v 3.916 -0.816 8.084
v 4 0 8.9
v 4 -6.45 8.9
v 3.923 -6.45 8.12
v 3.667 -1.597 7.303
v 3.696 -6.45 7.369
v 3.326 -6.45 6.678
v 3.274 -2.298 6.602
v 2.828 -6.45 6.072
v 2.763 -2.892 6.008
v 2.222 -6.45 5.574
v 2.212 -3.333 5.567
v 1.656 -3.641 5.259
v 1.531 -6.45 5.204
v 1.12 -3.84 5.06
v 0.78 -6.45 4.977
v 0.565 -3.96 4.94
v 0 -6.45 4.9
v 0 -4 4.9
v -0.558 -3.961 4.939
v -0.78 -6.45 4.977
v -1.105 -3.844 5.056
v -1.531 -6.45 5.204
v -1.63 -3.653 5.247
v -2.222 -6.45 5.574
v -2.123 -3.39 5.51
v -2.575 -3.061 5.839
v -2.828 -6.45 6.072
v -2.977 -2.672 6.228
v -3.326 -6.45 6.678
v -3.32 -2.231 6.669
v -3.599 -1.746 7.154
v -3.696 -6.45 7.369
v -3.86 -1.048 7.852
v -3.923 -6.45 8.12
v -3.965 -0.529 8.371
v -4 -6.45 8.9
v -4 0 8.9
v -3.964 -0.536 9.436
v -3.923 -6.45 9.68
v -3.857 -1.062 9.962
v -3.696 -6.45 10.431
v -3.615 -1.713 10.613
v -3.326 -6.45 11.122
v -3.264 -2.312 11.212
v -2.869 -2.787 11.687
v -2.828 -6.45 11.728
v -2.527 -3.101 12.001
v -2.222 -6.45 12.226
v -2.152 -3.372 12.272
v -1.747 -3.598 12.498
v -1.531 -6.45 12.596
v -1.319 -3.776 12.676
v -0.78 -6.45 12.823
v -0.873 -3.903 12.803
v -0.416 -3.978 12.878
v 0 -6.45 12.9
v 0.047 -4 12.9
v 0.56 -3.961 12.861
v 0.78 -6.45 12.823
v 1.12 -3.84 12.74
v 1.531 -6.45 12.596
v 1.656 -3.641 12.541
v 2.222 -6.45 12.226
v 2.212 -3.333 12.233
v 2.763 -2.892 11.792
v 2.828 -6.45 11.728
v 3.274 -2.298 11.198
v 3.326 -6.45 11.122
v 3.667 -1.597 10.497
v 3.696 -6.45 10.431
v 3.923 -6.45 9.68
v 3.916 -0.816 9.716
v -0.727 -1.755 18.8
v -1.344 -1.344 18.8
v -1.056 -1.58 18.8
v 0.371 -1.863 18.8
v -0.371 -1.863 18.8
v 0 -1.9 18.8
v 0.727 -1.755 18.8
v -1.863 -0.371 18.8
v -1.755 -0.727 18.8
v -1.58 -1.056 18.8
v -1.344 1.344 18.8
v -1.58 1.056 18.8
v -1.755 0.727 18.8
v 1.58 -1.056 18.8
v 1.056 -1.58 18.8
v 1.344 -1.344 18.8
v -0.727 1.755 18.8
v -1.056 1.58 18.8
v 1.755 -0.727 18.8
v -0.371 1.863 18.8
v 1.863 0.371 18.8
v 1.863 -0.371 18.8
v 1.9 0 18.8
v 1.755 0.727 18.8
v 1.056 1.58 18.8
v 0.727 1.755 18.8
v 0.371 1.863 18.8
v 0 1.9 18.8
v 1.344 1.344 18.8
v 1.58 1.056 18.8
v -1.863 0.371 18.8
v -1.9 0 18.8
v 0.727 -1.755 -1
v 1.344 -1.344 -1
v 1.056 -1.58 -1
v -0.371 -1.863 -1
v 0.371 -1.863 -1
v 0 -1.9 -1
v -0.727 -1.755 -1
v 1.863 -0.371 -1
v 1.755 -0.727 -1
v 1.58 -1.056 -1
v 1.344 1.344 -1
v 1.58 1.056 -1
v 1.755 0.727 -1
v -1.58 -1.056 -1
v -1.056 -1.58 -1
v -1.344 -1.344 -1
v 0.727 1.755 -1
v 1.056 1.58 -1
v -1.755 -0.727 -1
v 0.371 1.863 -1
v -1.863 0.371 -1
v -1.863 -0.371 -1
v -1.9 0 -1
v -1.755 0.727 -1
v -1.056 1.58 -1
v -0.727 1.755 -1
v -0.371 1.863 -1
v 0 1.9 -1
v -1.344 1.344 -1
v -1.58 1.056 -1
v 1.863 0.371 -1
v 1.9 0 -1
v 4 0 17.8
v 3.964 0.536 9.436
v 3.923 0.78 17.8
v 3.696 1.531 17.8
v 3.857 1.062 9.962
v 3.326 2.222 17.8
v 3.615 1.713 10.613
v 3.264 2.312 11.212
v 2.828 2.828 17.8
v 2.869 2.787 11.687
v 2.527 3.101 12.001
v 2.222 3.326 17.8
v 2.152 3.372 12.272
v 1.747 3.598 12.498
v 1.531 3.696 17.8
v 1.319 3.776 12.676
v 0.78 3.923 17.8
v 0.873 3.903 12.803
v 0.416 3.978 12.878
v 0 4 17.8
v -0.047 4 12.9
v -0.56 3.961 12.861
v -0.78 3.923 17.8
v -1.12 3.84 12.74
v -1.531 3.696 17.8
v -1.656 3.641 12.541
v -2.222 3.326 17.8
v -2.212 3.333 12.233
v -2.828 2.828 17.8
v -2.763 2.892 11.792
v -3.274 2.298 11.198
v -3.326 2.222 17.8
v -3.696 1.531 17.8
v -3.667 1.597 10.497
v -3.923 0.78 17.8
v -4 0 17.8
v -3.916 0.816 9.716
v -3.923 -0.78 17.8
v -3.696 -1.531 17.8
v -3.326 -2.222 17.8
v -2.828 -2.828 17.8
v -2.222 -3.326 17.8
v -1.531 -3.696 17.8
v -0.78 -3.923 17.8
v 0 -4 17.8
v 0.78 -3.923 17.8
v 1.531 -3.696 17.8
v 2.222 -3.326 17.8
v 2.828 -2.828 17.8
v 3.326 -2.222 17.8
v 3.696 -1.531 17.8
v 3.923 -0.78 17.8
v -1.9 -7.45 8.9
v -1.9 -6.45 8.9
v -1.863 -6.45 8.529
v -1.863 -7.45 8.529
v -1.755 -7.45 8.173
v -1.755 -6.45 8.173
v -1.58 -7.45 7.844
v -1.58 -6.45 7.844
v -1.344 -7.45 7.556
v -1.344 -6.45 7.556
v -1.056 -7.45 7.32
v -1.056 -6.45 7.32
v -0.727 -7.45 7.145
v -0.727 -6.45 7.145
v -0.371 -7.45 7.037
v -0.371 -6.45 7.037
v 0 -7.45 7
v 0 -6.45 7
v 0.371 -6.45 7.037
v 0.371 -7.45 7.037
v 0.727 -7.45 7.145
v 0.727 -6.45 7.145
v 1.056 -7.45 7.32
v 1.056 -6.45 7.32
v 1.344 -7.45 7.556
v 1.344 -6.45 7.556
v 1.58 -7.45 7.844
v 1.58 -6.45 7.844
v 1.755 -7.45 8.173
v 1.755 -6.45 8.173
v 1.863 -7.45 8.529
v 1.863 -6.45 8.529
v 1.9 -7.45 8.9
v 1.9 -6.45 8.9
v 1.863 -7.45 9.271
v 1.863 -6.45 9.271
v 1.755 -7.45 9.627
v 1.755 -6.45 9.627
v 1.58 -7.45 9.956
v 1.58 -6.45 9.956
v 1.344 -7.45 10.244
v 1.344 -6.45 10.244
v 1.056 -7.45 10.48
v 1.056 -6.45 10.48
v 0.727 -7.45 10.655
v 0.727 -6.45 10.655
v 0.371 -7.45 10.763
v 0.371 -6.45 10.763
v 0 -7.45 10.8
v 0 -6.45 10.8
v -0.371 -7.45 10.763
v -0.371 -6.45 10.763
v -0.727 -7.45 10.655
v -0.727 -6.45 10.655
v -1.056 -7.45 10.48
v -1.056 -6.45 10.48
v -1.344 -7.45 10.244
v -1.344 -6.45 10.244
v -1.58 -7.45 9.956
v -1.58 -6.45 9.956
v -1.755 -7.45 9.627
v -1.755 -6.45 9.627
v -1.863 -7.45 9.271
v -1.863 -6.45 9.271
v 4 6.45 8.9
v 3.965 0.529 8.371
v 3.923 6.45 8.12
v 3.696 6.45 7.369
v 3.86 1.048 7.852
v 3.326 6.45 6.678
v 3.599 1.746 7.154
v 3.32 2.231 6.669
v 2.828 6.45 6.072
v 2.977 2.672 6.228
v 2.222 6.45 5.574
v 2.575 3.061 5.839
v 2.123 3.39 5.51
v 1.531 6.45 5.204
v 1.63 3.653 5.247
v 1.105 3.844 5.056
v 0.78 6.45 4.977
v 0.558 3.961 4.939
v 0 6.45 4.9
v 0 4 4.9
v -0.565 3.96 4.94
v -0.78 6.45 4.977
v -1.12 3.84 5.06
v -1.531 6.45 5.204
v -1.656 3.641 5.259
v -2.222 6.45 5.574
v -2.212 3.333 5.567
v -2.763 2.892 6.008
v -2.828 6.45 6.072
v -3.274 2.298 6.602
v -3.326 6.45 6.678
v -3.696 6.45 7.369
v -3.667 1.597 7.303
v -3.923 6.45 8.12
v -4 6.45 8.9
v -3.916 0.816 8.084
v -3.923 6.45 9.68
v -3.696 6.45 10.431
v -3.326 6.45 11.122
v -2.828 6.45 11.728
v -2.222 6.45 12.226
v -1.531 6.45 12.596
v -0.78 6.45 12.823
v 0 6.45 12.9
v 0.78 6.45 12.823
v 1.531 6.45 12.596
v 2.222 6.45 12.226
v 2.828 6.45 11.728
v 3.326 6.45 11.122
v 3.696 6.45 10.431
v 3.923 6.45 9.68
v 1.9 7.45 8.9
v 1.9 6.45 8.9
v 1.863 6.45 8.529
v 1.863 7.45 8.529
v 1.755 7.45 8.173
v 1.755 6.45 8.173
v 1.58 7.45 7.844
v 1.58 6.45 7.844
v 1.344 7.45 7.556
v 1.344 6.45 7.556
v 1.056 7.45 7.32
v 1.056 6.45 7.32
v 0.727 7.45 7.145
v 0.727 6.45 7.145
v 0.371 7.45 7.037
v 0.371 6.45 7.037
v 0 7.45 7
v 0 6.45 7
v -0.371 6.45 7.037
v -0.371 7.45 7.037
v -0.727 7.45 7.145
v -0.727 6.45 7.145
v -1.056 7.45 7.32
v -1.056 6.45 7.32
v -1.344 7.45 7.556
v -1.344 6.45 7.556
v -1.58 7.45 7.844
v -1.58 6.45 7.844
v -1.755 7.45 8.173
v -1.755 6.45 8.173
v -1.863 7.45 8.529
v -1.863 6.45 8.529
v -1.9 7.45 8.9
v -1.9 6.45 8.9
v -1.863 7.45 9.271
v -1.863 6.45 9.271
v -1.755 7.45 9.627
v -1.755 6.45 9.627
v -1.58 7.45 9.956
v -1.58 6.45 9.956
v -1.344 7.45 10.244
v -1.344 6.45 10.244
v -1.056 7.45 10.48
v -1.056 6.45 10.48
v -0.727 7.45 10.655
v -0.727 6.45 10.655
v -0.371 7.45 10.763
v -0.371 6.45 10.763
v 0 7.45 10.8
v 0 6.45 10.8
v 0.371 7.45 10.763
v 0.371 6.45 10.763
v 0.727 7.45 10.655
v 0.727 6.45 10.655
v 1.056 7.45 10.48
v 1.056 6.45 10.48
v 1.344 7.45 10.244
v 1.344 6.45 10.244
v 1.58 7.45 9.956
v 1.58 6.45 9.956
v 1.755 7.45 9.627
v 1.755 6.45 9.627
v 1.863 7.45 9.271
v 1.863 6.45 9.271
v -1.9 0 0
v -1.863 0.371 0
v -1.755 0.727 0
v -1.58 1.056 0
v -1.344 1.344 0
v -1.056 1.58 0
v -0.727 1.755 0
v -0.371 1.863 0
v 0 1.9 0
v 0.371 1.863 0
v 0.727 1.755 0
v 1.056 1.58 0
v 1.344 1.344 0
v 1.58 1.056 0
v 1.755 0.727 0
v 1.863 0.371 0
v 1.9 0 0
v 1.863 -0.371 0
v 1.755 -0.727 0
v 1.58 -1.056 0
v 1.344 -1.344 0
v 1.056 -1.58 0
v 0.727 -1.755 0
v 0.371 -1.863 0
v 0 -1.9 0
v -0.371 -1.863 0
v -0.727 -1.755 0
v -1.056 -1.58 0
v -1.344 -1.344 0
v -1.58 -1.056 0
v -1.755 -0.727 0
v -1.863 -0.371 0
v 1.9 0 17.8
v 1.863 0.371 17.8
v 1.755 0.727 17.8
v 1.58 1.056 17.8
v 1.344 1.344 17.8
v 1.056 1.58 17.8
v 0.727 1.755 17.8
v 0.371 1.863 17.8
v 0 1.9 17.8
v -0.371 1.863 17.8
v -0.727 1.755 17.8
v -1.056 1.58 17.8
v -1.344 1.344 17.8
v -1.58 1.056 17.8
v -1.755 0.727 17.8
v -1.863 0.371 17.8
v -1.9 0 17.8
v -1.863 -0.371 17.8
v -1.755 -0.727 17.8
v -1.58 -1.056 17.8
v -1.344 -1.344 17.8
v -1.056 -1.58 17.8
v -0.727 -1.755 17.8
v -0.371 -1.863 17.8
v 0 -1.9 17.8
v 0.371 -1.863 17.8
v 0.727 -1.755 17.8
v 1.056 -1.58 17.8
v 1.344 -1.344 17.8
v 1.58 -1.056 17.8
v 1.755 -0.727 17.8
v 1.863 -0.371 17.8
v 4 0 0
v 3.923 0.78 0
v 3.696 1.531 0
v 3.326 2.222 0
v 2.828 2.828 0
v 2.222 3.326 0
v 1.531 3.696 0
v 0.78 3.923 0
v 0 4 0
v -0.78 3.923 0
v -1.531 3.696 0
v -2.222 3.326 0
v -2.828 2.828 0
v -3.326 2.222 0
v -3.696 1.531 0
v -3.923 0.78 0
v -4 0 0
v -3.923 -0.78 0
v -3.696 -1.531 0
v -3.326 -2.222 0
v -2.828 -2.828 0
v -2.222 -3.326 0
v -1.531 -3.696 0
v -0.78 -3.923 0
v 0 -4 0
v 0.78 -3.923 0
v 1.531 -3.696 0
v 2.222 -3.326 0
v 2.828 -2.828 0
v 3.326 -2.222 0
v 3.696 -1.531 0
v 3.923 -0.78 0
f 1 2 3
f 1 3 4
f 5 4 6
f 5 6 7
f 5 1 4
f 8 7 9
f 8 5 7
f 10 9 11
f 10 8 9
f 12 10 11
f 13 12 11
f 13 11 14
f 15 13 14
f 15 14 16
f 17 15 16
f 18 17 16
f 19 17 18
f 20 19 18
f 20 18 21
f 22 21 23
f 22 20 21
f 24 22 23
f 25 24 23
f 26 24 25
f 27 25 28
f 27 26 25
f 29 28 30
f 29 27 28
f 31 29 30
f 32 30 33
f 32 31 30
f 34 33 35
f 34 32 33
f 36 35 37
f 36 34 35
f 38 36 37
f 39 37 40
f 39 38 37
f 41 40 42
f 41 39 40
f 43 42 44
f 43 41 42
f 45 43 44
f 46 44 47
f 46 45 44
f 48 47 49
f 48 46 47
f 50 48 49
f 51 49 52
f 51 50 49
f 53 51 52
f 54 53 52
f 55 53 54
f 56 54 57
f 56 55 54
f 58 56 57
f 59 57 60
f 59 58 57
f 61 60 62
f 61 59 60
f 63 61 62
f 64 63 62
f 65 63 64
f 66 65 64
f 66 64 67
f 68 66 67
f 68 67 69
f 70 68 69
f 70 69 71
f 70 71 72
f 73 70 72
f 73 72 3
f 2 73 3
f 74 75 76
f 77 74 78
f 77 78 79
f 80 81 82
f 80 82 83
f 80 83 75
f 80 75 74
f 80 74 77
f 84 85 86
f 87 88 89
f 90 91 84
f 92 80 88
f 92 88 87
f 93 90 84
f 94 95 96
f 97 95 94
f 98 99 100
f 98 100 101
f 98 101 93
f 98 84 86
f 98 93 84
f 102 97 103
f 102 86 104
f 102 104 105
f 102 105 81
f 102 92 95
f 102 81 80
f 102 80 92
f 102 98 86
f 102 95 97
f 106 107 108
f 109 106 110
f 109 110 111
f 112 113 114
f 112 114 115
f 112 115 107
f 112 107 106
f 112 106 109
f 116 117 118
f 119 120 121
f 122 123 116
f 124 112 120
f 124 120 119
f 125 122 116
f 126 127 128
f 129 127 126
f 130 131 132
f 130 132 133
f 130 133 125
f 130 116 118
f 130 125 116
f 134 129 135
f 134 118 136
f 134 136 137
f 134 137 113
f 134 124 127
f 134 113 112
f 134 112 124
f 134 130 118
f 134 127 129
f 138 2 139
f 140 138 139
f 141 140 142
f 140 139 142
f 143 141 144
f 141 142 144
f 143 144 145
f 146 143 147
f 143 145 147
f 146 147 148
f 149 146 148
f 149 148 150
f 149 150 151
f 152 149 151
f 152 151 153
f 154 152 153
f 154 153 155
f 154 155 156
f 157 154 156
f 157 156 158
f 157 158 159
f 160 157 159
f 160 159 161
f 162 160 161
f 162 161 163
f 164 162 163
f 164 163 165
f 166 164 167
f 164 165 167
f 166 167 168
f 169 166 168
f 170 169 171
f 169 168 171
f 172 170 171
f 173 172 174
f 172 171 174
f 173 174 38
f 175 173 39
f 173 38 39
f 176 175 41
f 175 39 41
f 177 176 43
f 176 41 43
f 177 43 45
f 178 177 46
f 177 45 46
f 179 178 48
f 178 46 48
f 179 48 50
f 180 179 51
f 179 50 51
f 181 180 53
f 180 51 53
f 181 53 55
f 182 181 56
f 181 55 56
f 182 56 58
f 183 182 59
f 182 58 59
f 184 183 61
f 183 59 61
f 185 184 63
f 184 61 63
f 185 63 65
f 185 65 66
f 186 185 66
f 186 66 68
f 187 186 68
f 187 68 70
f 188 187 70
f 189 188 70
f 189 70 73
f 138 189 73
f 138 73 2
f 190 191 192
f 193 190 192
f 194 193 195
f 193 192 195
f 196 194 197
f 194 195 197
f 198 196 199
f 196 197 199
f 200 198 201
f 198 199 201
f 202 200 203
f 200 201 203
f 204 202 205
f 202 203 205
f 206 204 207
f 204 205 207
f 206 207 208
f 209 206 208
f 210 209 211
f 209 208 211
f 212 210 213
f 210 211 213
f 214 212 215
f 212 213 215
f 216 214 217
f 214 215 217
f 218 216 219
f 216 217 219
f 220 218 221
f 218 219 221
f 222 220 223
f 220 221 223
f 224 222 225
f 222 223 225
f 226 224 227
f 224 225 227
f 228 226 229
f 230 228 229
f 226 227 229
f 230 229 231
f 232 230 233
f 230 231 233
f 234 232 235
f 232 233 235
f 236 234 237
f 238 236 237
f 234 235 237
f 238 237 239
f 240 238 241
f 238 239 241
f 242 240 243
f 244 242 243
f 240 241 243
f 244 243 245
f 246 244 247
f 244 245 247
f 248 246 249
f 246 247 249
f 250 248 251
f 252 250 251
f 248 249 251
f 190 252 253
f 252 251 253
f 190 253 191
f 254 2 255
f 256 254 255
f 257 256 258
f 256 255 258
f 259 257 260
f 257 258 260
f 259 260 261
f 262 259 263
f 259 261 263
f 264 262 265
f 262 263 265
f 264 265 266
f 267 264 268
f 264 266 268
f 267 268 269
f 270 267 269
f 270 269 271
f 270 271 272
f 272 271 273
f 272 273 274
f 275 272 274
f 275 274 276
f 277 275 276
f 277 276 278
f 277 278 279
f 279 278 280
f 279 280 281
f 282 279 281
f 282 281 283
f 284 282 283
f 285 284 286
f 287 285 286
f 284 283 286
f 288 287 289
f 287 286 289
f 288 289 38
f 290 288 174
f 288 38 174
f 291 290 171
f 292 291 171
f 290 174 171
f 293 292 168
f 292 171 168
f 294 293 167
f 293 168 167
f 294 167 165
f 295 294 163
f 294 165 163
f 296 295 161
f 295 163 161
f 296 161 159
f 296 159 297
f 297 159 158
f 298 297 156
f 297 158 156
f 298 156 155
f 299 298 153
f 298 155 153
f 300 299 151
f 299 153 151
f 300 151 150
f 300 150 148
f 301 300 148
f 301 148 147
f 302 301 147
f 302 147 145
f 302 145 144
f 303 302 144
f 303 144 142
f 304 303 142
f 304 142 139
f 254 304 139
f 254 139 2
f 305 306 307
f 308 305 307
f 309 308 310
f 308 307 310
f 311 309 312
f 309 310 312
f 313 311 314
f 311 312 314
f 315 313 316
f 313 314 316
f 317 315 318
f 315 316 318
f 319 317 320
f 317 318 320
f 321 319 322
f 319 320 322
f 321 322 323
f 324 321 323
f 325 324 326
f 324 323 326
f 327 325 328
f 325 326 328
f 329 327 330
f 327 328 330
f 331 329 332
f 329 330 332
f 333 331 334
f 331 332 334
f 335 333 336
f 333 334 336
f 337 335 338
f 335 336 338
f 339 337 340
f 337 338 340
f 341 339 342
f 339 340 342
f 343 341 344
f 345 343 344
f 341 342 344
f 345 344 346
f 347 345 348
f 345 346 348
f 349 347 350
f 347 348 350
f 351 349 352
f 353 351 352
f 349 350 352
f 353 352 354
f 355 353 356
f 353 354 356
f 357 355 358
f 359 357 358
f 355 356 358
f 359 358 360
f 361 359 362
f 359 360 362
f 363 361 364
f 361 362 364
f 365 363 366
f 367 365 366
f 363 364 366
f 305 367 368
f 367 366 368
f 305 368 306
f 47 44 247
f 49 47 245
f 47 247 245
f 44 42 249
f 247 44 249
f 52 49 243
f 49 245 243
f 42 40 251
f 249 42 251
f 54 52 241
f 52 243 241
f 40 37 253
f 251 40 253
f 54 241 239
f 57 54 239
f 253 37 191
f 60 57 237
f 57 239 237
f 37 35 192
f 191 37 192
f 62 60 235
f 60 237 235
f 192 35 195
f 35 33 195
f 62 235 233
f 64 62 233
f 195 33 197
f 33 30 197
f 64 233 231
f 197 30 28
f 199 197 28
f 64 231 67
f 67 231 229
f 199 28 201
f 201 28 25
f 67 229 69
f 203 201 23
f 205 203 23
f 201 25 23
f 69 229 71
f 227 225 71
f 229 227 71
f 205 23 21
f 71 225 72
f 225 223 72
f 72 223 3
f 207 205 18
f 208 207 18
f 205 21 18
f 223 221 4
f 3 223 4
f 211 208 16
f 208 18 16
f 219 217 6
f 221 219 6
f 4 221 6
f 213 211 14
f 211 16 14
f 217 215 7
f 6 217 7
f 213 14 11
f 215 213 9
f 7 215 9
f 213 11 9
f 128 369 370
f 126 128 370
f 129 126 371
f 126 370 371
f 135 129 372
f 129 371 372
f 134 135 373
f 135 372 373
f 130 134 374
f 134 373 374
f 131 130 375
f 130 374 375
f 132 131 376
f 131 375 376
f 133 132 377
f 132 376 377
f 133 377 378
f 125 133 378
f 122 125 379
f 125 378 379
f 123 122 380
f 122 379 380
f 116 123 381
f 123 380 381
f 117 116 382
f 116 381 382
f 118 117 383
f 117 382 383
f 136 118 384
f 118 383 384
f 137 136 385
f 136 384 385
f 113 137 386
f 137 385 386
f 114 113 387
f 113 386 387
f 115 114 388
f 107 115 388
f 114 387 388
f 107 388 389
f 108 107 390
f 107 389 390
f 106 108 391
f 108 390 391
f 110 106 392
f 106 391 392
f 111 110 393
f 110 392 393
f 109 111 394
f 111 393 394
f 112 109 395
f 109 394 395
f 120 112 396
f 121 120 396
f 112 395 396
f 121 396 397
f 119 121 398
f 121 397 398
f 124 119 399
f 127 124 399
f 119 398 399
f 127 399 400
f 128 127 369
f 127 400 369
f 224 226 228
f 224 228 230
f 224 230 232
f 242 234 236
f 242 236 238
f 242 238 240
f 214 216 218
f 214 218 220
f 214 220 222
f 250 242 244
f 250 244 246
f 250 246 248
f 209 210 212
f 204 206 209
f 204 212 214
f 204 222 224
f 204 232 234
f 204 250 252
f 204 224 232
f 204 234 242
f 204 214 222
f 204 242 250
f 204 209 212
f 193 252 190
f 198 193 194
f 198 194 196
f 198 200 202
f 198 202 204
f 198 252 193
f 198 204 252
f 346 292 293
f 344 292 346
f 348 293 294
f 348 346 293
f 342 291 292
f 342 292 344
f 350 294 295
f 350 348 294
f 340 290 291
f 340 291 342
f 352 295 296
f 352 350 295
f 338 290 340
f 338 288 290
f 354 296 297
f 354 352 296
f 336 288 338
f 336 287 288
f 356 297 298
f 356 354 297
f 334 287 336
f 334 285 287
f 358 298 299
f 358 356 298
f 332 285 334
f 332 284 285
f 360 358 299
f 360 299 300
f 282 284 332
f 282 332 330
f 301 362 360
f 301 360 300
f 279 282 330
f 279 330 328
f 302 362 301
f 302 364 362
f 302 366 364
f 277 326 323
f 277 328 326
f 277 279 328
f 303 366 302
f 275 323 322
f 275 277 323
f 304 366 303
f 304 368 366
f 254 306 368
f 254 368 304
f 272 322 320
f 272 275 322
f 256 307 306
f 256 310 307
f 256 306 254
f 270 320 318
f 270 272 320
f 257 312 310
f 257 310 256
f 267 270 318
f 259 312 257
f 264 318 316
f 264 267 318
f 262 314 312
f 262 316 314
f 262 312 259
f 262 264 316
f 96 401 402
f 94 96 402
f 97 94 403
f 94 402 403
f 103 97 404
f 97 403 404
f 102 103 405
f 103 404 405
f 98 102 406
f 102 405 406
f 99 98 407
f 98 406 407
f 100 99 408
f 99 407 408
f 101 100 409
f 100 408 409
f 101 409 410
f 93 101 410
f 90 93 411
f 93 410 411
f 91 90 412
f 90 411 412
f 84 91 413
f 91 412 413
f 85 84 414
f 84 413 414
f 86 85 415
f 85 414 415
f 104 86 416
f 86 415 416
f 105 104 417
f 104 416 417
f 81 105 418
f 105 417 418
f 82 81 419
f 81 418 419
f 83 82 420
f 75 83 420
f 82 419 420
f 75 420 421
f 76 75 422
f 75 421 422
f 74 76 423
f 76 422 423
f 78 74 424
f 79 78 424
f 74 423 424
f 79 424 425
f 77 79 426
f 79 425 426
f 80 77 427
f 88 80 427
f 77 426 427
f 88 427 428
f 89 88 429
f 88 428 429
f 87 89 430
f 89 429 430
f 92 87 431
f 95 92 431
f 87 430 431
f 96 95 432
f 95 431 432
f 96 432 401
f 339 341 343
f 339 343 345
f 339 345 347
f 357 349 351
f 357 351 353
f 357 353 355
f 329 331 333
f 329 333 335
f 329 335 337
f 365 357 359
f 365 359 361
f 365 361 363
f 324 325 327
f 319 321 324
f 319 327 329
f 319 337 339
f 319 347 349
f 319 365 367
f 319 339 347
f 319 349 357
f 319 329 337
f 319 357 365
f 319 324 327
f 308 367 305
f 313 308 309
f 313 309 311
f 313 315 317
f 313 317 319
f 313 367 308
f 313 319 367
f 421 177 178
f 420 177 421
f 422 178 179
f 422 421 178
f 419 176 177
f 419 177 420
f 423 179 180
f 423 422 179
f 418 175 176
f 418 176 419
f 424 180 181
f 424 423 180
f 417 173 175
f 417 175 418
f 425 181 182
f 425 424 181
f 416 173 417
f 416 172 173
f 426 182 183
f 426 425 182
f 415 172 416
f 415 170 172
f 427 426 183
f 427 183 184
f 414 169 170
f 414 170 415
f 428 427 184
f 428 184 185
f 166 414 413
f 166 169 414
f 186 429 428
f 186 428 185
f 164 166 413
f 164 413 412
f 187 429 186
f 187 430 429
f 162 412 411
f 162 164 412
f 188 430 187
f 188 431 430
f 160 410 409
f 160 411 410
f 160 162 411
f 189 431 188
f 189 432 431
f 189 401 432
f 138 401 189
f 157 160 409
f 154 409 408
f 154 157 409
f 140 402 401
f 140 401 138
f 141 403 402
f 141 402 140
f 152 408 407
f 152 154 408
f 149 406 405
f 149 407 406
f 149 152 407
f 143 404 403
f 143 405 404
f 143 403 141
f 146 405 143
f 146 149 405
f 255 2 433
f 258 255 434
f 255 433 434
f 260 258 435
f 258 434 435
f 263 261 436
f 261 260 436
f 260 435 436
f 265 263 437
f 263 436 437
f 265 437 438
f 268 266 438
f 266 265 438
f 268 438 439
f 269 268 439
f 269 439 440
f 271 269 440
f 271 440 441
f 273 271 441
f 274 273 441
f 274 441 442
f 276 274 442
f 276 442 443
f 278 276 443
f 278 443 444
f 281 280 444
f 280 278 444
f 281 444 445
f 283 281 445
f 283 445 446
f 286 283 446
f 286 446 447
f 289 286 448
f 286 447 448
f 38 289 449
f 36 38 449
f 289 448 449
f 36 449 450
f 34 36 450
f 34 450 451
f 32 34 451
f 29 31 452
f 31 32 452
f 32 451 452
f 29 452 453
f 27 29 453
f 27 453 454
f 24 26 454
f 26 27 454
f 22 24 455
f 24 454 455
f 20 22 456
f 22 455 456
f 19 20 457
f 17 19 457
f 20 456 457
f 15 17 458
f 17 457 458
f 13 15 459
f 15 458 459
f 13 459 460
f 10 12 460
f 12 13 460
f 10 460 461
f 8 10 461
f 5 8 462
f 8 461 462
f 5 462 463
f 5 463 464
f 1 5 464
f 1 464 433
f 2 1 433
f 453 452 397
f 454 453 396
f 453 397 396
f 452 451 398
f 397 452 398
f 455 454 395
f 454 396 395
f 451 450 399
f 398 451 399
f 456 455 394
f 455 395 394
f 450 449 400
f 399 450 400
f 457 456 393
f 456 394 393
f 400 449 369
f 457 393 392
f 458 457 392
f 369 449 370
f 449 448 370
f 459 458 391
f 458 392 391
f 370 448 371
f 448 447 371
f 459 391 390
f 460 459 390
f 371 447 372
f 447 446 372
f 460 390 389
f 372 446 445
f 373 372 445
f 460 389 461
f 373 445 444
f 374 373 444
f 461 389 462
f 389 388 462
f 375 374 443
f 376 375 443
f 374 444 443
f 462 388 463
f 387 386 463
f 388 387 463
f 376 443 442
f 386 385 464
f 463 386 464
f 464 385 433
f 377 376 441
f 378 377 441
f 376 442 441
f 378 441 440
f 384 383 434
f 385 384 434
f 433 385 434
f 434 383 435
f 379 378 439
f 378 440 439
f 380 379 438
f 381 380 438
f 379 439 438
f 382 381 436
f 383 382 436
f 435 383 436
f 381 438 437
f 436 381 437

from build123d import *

# Parameters (mm, degrees)
SKETCH_1_R           = 4
EXTRUDE_1_DEPTH      = 17.8
SKETCH_2_R           = 1.9
EXTRUDE_2_DEPTH      = 1
EXTRUDE_START        = 1
SKETCH_3_R           = 1.9
EXTRUDE_3_DEPTH      = 1
EXTRUDE_4_DEPTH      = 6.45
EXTRUDE_4_DEPTH_BACK = 6.45
SKETCH_4_R           = 4
SKETCH_5_R           = 1.9
EXTRUDE_5_DEPTH      = 1
SKETCH_6_R           = 1.9
EXTRUDE_6_DEPTH      = 1


with BuildPart() as part:
    # 草图1 → 凸台-拉伸1 (new body)
    with BuildSketch(Plane.XY):
        Circle(SKETCH_1_R)
    extrude(amount=EXTRUDE_1_DEPTH)

    # 草图2 → 凸台-拉伸2 (add)
    with BuildSketch(Plane.XY.offset(17.8)):
        Circle(SKETCH_2_R)
    extrude(amount=EXTRUDE_2_DEPTH)

    # 草图3 → 凸台-拉伸3 (add)
    with BuildSketch(Plane(origin=(0, 0, 0), x_dir=(-1, 0, 0), z_dir=(0, 0, -1)).offset(EXTRUDE_START)):
        Circle(SKETCH_3_R)
    extrude(amount=-EXTRUDE_3_DEPTH)

    # 草图4 → 凸台-拉伸4 (add, two sides: drawn at the far end of the back side and taken through both)
    with BuildSketch(Plane(origin=(0, 0, 0), x_dir=(1, 0, 0), z_dir=(0, 1, 0)).offset(-EXTRUDE_4_DEPTH_BACK)):
        with Locations((0, -8.9)):
            Circle(SKETCH_4_R)
    extrude(amount=EXTRUDE_4_DEPTH + EXTRUDE_4_DEPTH_BACK)

    # 草图5 → 凸台-拉伸5 (add)
    with BuildSketch(Plane(origin=(0, -6.45, 0), x_dir=(-1, 0, 0), z_dir=(0, -1, 0))):
        with Locations((0, -8.9)):
            Circle(SKETCH_5_R)
    extrude(amount=EXTRUDE_5_DEPTH)

    # 草图6 → 凸台-拉伸6 (add)
    with BuildSketch(Plane(origin=(0, 6.45, 0), x_dir=(1, 0, 0), z_dir=(0, 1, 0)).offset(EXTRUDE_START)):
        with Locations((0, -8.9)):
            Circle(SKETCH_6_R)
    extrude(amount=-EXTRUDE_6_DEPTH)


solid = part.part
